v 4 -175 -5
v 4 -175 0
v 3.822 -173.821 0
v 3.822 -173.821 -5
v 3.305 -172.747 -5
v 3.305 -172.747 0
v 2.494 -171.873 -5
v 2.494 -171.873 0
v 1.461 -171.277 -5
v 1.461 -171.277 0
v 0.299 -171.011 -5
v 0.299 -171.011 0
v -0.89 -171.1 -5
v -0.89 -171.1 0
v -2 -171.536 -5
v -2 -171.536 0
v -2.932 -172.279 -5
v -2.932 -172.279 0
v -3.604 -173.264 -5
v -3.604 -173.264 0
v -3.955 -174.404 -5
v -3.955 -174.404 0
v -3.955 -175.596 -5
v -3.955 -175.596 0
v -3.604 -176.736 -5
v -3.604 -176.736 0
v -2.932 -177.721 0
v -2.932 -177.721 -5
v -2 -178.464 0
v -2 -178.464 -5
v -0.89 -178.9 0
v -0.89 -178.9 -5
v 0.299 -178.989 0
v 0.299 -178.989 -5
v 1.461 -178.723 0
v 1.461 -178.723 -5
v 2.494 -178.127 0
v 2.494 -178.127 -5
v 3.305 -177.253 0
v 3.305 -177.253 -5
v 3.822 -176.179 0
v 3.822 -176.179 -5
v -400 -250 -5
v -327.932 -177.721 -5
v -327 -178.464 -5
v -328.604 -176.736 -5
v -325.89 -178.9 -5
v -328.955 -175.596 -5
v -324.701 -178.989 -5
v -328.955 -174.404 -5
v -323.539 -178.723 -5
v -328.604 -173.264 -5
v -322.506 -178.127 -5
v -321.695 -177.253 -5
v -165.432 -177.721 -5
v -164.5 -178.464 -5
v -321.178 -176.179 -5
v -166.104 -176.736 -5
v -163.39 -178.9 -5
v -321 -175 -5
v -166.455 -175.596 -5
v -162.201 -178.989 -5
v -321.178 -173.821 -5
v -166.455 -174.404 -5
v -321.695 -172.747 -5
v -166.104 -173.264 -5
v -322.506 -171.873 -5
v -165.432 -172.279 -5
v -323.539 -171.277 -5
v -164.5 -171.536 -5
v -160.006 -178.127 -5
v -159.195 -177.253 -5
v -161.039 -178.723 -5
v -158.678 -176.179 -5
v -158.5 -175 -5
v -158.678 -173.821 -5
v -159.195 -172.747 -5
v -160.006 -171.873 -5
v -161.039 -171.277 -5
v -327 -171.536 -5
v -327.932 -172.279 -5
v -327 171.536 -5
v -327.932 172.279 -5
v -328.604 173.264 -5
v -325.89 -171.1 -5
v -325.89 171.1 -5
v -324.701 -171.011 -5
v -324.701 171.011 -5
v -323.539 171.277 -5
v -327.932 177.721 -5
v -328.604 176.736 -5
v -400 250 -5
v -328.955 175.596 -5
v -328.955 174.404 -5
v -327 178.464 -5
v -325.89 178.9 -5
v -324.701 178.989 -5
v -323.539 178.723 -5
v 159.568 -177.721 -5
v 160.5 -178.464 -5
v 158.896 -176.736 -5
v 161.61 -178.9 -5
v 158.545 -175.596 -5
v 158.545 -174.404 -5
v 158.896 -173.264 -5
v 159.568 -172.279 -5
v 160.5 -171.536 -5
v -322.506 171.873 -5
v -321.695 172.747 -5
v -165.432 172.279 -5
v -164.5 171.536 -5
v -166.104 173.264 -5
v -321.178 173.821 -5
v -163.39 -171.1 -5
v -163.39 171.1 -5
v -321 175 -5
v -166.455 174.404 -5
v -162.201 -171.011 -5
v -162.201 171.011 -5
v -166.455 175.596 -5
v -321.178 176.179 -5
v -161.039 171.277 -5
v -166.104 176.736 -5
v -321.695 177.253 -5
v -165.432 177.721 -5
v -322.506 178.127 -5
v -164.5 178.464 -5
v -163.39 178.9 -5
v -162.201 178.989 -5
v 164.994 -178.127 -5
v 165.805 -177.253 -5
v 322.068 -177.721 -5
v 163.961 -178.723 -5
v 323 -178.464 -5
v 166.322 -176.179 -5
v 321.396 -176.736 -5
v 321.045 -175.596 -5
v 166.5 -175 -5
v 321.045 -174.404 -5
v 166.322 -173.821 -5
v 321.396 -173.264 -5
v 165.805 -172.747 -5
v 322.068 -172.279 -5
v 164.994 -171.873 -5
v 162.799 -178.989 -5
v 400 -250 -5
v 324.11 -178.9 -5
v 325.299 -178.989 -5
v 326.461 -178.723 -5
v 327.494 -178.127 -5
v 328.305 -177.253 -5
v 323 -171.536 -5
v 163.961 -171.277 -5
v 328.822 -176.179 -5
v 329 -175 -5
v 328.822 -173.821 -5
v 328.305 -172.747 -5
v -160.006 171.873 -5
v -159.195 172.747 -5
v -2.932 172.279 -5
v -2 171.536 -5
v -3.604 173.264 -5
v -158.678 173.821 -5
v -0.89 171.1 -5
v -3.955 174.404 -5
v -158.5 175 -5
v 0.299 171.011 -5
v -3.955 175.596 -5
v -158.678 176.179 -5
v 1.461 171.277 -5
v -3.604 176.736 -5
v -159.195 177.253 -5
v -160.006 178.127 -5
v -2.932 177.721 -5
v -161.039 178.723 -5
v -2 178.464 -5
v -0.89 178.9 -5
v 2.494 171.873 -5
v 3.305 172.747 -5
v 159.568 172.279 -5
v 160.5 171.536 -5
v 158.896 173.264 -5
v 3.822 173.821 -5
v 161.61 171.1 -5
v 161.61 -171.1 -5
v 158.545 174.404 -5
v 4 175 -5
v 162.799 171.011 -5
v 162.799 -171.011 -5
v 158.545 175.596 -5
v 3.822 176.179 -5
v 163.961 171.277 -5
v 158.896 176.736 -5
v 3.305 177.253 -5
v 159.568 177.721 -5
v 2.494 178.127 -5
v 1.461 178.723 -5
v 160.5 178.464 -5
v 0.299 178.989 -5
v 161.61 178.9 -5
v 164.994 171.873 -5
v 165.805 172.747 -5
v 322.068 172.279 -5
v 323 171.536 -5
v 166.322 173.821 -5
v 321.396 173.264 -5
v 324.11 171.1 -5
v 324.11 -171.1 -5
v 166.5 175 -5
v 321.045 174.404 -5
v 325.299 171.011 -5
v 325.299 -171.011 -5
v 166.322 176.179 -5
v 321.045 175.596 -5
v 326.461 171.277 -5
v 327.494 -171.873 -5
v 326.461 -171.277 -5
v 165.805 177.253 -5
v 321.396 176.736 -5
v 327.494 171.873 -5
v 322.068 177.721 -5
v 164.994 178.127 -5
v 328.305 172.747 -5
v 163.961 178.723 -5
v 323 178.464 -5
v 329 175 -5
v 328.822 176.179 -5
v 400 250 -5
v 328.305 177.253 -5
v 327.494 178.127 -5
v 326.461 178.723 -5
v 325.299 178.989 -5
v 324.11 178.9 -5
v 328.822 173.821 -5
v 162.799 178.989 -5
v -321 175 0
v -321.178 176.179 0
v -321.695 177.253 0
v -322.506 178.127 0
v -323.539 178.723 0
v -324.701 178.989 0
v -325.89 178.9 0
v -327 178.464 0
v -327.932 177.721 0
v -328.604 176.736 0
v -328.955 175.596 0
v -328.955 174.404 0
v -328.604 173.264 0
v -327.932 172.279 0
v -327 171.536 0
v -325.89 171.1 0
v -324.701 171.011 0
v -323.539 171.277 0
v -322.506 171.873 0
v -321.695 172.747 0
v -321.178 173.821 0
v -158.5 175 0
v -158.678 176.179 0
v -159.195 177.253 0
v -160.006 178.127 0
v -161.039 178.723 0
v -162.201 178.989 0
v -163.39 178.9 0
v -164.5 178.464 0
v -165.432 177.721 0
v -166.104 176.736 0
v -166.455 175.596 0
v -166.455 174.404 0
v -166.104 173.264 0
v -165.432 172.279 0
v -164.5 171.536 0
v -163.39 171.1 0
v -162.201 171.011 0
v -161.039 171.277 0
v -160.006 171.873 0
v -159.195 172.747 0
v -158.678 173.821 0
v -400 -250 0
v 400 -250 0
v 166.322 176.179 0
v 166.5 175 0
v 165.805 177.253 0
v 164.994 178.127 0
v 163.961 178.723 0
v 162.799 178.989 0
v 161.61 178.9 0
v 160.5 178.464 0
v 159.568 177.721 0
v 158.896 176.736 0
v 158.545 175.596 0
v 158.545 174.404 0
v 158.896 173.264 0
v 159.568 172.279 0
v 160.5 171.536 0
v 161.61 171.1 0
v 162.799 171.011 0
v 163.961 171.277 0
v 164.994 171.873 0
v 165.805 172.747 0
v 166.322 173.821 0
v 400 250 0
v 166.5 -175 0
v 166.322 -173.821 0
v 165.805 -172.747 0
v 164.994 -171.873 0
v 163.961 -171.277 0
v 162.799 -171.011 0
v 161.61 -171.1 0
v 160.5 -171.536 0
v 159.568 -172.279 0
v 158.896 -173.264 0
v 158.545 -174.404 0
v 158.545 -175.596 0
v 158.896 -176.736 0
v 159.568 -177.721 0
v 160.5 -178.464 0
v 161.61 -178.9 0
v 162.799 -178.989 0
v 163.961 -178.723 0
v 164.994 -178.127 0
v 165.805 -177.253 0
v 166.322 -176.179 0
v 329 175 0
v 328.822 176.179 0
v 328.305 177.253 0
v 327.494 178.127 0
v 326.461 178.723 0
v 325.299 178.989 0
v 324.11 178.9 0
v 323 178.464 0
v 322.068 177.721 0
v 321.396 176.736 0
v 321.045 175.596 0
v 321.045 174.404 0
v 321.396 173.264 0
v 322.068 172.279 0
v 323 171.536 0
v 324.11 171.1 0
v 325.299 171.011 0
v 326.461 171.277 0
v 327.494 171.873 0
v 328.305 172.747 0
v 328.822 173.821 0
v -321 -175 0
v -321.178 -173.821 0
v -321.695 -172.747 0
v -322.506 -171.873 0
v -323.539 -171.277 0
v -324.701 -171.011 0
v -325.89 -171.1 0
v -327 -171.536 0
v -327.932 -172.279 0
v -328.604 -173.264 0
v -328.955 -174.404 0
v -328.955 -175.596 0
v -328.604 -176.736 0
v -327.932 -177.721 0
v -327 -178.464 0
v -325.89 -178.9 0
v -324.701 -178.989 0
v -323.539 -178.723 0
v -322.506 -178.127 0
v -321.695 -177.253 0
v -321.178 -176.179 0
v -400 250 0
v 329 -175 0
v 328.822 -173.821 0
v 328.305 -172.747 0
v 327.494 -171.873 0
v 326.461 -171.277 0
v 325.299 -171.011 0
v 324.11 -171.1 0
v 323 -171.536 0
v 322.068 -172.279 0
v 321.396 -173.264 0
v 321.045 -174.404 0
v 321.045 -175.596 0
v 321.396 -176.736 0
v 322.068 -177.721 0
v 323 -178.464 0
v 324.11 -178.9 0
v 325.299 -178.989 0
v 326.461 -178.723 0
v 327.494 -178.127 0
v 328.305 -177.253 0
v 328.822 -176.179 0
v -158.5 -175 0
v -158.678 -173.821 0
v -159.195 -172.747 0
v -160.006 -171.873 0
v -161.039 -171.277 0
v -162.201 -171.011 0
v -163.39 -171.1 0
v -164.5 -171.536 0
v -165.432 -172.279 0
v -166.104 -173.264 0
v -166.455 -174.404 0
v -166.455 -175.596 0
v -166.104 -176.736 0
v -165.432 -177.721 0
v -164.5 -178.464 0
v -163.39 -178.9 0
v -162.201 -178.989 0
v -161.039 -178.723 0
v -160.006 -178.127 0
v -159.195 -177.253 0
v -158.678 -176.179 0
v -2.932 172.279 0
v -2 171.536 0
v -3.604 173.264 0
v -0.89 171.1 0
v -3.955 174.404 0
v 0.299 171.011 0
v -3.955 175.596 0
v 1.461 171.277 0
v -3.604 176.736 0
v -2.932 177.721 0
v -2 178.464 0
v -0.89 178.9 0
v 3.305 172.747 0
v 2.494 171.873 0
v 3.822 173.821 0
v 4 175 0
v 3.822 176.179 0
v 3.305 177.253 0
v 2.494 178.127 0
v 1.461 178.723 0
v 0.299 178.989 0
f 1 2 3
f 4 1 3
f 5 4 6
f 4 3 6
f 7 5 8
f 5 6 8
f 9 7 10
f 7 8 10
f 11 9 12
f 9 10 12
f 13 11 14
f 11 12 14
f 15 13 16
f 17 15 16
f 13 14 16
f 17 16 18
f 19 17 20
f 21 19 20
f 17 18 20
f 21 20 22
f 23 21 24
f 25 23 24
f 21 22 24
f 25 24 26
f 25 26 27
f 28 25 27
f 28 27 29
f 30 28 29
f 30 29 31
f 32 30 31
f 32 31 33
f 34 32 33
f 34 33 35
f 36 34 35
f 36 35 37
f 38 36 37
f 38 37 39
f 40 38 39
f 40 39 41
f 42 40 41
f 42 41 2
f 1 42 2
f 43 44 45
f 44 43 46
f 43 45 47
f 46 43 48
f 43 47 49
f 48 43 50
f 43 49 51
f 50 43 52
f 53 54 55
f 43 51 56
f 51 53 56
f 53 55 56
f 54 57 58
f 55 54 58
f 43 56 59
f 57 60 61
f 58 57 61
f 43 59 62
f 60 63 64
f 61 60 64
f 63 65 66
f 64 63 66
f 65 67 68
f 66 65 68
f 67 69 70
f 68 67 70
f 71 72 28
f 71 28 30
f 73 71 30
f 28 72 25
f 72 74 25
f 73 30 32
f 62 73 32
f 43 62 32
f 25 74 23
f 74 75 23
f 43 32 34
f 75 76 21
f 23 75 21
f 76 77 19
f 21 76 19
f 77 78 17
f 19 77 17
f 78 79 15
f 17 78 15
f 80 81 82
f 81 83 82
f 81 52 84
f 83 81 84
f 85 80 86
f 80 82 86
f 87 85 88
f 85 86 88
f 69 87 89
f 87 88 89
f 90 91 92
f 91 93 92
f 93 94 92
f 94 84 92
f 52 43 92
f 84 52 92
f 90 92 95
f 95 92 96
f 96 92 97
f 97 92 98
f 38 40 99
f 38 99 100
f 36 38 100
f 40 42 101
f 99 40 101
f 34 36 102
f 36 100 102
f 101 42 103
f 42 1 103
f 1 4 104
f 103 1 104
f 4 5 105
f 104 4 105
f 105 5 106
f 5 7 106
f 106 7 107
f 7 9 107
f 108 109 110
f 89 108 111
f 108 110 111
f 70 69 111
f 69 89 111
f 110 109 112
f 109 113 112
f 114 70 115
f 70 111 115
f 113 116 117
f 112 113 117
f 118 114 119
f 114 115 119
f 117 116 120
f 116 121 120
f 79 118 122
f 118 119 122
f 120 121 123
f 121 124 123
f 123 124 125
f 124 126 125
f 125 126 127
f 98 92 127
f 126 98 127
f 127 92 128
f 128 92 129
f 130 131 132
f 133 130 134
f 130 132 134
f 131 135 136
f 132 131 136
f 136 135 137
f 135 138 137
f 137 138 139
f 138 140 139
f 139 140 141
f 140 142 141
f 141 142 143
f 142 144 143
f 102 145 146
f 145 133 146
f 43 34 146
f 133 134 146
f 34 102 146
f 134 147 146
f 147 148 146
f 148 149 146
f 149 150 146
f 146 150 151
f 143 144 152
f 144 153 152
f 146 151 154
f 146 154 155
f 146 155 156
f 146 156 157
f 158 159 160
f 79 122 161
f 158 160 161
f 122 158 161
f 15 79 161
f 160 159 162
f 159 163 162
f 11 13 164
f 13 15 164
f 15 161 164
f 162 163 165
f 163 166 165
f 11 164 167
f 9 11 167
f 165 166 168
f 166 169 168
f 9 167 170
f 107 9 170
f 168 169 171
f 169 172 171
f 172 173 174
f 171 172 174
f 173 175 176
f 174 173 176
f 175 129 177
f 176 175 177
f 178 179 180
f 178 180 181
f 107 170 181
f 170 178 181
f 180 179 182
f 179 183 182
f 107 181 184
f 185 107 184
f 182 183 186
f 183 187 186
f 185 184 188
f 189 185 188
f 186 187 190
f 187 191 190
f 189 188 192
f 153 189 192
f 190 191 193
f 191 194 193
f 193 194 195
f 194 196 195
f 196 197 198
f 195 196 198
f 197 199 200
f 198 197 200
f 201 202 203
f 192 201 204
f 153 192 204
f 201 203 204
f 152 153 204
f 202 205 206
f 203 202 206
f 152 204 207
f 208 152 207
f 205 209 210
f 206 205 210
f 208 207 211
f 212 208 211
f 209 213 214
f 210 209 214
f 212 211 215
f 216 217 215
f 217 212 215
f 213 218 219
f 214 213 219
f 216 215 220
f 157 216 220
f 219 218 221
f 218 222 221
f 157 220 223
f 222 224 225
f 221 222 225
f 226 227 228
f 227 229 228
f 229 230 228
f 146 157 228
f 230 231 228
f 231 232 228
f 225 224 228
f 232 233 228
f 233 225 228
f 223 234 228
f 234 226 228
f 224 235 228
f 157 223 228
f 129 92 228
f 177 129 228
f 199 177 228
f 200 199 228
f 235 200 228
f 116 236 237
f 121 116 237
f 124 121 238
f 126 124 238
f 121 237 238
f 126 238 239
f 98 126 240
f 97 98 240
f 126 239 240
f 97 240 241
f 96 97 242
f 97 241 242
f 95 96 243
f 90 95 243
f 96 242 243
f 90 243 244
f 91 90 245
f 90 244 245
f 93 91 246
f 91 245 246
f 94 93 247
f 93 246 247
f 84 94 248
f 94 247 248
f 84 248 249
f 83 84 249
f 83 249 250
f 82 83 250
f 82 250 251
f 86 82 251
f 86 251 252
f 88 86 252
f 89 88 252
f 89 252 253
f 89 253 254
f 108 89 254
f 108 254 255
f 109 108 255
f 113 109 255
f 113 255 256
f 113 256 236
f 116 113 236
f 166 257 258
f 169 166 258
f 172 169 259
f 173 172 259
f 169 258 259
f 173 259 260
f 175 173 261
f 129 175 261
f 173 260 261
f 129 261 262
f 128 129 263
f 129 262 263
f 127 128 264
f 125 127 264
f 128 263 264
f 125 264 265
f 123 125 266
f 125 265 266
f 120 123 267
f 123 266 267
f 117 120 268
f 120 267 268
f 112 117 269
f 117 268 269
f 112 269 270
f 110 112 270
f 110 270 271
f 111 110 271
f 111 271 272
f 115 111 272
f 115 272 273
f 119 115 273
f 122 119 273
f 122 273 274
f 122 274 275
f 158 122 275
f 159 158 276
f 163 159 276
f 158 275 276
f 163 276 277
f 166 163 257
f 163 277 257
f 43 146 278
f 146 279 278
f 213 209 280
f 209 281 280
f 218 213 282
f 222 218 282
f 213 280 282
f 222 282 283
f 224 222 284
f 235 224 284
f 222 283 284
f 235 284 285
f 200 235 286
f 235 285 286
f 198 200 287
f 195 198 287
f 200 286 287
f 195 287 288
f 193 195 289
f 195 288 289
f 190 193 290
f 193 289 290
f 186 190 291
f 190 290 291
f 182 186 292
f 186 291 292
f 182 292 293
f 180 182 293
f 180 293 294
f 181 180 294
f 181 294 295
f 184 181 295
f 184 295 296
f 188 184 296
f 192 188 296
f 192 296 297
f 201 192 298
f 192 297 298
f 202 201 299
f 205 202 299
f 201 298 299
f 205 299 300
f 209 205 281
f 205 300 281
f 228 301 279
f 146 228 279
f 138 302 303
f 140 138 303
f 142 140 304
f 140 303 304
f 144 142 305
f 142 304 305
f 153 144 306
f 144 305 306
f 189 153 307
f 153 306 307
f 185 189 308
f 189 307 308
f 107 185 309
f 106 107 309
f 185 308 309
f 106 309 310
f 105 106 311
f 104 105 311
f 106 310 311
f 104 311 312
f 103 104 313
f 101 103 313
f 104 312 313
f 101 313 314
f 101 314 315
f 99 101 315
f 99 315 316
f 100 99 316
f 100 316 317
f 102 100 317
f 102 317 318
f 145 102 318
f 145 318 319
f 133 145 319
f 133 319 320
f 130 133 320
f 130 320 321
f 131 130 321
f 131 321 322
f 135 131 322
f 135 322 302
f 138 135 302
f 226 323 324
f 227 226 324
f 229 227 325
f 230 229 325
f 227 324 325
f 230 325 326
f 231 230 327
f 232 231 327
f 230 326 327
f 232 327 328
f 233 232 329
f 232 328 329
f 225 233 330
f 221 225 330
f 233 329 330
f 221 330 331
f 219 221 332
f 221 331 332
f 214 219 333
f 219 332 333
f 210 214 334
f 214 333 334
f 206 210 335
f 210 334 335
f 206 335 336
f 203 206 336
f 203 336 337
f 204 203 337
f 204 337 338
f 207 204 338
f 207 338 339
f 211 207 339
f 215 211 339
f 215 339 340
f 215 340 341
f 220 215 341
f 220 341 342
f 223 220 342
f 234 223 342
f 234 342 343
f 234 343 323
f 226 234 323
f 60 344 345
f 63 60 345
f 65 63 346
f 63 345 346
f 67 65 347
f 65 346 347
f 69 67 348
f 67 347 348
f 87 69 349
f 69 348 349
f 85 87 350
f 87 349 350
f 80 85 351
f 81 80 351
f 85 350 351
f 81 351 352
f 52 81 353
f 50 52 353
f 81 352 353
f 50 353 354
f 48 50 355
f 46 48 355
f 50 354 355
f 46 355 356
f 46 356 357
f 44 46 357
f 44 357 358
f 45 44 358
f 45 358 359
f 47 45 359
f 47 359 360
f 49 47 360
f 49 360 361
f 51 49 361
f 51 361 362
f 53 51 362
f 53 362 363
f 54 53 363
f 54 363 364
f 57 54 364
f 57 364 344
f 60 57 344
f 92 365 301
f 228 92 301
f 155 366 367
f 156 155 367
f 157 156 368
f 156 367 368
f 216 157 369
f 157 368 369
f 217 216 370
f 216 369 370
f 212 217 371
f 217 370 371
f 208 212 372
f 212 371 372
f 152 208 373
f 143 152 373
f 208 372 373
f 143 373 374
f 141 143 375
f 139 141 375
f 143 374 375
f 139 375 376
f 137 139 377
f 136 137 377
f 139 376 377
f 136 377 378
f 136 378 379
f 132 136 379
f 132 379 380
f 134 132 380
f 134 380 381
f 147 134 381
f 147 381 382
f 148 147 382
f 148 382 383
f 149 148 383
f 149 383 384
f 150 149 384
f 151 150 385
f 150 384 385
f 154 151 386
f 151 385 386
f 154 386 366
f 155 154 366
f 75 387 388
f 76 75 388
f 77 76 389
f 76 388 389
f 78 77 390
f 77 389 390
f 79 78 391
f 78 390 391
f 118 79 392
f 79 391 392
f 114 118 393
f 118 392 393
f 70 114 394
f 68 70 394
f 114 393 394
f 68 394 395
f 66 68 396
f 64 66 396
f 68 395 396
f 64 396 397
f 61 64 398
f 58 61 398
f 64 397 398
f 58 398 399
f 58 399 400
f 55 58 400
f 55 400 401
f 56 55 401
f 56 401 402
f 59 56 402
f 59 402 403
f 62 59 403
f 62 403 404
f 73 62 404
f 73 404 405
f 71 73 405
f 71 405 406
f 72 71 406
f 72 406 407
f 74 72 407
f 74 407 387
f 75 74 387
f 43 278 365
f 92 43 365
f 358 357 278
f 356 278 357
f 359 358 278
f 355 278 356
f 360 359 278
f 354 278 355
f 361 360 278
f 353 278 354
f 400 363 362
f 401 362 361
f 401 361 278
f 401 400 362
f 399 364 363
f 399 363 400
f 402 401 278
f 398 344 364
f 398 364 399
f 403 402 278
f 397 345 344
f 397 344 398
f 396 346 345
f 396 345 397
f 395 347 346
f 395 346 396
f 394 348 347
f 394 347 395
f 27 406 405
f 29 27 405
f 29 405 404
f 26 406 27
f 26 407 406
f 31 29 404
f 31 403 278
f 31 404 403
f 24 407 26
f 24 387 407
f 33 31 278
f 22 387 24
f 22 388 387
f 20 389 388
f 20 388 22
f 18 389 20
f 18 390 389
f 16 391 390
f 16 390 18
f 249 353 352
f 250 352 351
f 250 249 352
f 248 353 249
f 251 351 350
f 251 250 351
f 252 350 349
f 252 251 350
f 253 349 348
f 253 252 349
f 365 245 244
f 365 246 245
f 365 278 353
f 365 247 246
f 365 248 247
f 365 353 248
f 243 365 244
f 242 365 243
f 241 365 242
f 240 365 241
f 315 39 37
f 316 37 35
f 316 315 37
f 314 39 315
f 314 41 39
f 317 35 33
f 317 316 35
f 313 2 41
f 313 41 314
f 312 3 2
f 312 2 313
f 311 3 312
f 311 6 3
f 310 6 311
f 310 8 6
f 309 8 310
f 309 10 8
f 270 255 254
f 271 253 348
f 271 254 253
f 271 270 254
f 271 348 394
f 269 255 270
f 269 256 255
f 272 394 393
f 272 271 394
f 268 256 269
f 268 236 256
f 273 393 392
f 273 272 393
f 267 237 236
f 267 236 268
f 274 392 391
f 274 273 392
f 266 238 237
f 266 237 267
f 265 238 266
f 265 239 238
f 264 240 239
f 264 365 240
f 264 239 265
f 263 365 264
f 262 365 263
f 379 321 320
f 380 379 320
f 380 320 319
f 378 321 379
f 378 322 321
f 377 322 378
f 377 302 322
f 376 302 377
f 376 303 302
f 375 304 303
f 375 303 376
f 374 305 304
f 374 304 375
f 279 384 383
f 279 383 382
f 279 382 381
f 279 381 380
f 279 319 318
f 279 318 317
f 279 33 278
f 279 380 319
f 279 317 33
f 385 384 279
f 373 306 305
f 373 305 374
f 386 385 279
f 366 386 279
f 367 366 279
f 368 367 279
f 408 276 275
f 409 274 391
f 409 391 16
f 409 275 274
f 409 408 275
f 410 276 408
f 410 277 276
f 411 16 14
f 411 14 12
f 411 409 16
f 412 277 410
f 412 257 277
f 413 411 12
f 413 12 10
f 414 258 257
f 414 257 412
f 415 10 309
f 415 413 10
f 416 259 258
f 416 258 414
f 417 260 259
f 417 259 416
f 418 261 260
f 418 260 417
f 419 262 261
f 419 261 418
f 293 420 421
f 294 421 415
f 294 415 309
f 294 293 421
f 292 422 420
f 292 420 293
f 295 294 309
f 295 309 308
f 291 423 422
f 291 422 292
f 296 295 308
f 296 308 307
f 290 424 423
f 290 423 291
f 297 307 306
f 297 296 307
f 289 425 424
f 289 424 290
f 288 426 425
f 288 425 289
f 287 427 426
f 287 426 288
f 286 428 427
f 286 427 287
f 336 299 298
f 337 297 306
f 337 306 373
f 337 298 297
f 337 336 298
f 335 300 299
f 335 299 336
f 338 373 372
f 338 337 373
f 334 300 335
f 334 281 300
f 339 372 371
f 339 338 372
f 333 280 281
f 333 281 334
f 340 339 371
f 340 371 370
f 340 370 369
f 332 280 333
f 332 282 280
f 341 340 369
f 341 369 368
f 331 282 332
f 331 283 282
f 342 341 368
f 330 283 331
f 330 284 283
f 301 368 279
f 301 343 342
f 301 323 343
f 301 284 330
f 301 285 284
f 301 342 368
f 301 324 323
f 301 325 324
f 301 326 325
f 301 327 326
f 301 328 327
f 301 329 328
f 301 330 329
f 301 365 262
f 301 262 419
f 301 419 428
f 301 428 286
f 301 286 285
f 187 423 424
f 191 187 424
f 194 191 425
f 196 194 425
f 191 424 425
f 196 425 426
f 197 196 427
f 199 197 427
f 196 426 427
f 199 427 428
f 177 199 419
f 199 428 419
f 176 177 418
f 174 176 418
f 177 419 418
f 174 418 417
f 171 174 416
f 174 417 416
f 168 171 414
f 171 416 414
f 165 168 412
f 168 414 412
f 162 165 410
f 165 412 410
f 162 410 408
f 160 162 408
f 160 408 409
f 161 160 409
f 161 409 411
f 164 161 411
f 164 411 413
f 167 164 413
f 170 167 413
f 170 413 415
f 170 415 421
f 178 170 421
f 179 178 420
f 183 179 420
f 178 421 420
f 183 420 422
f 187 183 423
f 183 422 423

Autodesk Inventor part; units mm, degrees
ref_plane "YZ Plane" through (0, 0, 0) normal (1, 0, 0) x (0, 1, 0)
ref_plane "XZ Plane" through (0, 0, 0) normal (0, 1, 0) x (-1, 0, 0)
ref_plane "XY Plane" through (0, 0, 0) normal (0, 0, 1) x (1, 0, 0)
sketch "base_layout_sketch" plane through (0, 0, 0) normal (0, 0, 1) x (1, 0, 0)
  line L0 (-400, 200) -> (400, 200)
  line L1 (400, 200) -> (400, -200)
  line L2 (400, -200) -> (-400, -200)
  line L3 (-400, -200) -> (-400, 200)
  line L4 (0, 200) -> (0, -200) construction
  line L5 (-400, 150) -> (400, 150)
  line L6 (400, 150) -> (400, -150)
  line L7 (400, -150) -> (-400, -150)
  line L8 (-400, -150) -> (-400, 150)
  line L9 (0, 150) -> (0, -150) construction
  line L10 (-400, 250) -> (400, 250)
  line L11 (400, 250) -> (400, -250)
  line L12 (400, -250) -> (-400, -250)
  line L13 (-400, -250) -> (-400, 250)
  line L14 (0, 250) -> (0, -250) construction
  point P0 (0, 0)
  point P1 (0, 0)
  dimension "d0" = 400
  dimension "d1" = 800
  dimension "d2" = 300
  dimension "d4" = 500
sketch "bolt_holes_sketch" plane through (0, 0, 0) normal (0, 0, 1) x (1, 0, 0)
  circle A0 centre (-325, 175) radius 4
  line L0 (-400, 250) -> (400, 250) projected
  line L1 (-400, -250) -> (-400, 250) projected
  line L2 (-560, 0) -> (560, 0) projected
  point P0 (0, 0)
  dimension "d3" = 8
  dimension "d6" = 75
  dimension "d21" = 175
extrude "sheet_visualisation" add sketch "base_layout_sketch" against normal blind 5
extrude "bolt_holes Cut" cut sketch "bolt_holes_sketch" against normal through all
pattern_linear "bolt_holes_upper Pattern" count 5 spacing 162.5 along (1, 0, 0) of "bolt_holes Cut"
mirror "bolt_holes Mirror" about plane through (0, 0, 0) normal (0, 1, 0) of "bolt_holes Cut", "bolt_holes_upper Pattern"
equation "\"d0\" = layer_width"
equation "\"d1\" = track_length"
equation "\"d2\" = coil_width"
equation "\"d4\" = real_sheet_width"
equation "\"d3\" = bolt_diameter"
equation "\"d6\" = x_offset_for_bolts"
equation "\"d21\" = y_offset_for_bolts"
equation "\"d14\" = sheet_thickness"
equation "\"track_length\" = 800"
equation "\"layer_width\" = 400"
equation "\"coil_width\" = 300"
equation "\"bolt_diameter\" = 8"
equation "\"real_sheet_width\" = 500"
equation "\"x_offset_for_bolts\" = 75"
equation "\"y_offset_for_bolts\" = 175"
equation "\"sheet_thickness\" = 5"
properties part number "bolt_holes_for_all"
